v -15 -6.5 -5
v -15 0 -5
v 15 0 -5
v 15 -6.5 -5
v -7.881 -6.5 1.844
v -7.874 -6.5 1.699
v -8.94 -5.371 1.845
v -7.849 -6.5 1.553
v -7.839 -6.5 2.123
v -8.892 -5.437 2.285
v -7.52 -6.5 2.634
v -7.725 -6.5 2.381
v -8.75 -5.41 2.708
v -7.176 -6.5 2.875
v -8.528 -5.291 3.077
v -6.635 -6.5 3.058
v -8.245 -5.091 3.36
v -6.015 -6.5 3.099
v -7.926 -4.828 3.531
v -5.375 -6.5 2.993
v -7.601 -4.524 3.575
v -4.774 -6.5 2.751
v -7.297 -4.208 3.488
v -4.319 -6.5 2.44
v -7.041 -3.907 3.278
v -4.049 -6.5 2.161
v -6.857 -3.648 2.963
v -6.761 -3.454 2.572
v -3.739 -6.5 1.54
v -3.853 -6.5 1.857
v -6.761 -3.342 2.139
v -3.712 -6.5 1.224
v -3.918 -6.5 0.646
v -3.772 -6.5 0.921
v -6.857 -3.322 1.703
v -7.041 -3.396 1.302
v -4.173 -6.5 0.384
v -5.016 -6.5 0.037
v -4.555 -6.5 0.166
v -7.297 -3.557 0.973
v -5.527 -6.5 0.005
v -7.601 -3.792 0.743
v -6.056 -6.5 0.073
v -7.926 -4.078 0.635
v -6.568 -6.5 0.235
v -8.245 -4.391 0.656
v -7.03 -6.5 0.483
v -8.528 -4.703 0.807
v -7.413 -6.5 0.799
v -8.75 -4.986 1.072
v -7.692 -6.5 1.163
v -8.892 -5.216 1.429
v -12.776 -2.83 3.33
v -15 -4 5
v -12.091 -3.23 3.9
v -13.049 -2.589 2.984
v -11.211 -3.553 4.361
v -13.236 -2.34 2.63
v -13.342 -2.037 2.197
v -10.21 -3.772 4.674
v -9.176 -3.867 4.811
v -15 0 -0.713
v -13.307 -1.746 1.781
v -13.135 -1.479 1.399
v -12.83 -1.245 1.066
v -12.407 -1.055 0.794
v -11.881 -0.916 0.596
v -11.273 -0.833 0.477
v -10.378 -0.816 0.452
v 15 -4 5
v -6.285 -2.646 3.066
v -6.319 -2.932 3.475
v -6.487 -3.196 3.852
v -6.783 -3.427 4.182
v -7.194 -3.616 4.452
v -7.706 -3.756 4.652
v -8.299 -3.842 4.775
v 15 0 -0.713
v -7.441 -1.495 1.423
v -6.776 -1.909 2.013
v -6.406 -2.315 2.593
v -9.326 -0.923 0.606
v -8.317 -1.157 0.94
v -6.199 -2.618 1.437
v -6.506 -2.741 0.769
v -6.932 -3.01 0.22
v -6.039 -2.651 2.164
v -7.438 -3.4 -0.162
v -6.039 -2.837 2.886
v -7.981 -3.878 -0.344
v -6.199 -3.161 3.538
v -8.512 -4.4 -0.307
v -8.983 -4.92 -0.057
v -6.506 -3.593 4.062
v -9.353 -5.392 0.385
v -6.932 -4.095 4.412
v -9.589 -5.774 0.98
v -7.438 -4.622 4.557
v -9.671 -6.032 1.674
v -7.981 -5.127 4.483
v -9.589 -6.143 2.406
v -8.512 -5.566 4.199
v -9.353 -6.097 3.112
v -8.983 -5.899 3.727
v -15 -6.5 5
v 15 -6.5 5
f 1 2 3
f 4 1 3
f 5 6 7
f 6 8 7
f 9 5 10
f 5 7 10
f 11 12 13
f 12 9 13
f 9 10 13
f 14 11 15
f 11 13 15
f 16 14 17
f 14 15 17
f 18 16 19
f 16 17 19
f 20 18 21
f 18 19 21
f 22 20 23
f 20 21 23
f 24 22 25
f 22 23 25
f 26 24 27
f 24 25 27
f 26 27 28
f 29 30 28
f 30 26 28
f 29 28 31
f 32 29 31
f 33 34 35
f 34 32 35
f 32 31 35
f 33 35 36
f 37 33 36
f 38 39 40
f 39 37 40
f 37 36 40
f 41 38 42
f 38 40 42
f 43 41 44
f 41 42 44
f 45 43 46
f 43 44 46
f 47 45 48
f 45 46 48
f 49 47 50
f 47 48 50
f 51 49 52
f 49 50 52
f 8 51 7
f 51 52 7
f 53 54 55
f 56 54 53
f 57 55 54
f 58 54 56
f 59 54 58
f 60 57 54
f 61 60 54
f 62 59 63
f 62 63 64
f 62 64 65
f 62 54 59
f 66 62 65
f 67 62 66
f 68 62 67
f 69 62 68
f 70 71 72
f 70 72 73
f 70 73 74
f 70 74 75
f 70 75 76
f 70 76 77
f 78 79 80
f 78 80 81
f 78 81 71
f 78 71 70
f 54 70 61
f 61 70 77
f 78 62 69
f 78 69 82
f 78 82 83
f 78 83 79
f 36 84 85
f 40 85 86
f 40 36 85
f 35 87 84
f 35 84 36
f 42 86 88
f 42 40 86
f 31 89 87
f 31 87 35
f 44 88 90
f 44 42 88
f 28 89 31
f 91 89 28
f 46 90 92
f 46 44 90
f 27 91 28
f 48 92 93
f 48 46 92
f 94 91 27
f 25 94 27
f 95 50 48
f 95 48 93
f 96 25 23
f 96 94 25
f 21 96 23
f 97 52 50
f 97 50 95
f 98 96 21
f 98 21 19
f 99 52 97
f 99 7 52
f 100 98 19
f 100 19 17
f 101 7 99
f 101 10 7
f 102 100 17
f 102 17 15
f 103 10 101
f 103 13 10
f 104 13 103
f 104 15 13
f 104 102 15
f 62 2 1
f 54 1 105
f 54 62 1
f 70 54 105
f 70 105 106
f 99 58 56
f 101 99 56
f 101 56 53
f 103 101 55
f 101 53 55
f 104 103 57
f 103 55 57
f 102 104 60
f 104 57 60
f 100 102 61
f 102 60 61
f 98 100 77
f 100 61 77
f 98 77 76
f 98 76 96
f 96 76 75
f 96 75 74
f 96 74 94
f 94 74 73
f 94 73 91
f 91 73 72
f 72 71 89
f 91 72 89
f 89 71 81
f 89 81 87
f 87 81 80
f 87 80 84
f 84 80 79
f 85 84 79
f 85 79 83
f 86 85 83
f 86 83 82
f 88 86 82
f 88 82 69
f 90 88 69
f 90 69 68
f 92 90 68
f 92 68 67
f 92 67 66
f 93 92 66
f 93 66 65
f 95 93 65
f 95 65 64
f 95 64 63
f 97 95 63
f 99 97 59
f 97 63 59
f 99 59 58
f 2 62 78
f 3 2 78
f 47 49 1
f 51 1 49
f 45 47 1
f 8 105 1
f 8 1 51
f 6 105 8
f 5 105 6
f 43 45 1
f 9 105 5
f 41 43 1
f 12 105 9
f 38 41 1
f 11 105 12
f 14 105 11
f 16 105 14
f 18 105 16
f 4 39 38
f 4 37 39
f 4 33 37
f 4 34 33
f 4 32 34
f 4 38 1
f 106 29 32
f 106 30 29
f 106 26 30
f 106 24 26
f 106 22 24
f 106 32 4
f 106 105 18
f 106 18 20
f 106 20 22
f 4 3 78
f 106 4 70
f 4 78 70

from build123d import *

# Parameters (mm, degrees)
F0_W      = 30
F0_H      = 10
F1_DEPTH  = 6.5
F6_SIZE2  = 5.712592027
F6_SIZE   = 4
F9_R      = 1.5
F10_DEPTH = 12.5
F12_R     = 2.5
F13_DEPTH = 22


with BuildPart() as f1:
    # F0 (on Front) → F1 (new body)
    with BuildSketch(Plane.XZ):
        Rectangle(F0_W, F0_H)
    extrude(amount=F1_DEPTH)

    # F6
    f6_edges = [f1.edges().sort_by_distance(p)[0] for p in [
        (0, 0, 5),
    ]]
    f6_side = f1.faces().sort_by_distance((0, -3.25, 5))[0]
    chamfer(f6_edges, length=F6_SIZE, length2=F6_SIZE2, reference=f6_side)

    # F9 (on face) → F10 (cut, symmetric)
    with BuildSketch(Plane(origin=(0.2414814566, -0.25, -0.0647047613), x_dir=(-0.7304064958, -0.6612248329, -0.1711375799), z_dir=(-0.6830127019, 0.7071067812, 0.1830127019))):
        with Locations((8.2653104118, 3.1320350886)):
            Circle(F9_R)
    extrude(amount=F10_DEPTH, both=True, mode=Mode.SUBTRACT)

    # F12 (on face) → F13 (cut)
    with BuildSketch(Plane(origin=(-16.8338360907, 17.4276695297, 4.510612786), x_dir=(-0.7304064958, -0.6612248329, -0.1711375799), z_dir=(-0.6830127019, 0.7071067812, 0.1830127019))):
        with Locations((8.2653104118, 3.1320350886)):
            Circle(F12_R)
    extrude(amount=-F13_DEPTH, mode=Mode.SUBTRACT)


solid = f1.part
